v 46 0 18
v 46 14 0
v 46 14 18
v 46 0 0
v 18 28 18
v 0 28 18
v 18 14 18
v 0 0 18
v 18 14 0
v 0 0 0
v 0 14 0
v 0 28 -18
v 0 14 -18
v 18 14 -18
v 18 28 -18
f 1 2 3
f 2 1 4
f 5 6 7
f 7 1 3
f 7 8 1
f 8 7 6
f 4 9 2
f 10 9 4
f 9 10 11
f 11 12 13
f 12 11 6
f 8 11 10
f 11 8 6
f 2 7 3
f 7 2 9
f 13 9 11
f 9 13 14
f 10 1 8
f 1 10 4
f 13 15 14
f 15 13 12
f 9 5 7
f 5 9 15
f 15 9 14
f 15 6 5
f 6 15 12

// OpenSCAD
cube([46,14,18]);
translate([0,14,18])rotate([0,90,0])cube([36,14,18]);
